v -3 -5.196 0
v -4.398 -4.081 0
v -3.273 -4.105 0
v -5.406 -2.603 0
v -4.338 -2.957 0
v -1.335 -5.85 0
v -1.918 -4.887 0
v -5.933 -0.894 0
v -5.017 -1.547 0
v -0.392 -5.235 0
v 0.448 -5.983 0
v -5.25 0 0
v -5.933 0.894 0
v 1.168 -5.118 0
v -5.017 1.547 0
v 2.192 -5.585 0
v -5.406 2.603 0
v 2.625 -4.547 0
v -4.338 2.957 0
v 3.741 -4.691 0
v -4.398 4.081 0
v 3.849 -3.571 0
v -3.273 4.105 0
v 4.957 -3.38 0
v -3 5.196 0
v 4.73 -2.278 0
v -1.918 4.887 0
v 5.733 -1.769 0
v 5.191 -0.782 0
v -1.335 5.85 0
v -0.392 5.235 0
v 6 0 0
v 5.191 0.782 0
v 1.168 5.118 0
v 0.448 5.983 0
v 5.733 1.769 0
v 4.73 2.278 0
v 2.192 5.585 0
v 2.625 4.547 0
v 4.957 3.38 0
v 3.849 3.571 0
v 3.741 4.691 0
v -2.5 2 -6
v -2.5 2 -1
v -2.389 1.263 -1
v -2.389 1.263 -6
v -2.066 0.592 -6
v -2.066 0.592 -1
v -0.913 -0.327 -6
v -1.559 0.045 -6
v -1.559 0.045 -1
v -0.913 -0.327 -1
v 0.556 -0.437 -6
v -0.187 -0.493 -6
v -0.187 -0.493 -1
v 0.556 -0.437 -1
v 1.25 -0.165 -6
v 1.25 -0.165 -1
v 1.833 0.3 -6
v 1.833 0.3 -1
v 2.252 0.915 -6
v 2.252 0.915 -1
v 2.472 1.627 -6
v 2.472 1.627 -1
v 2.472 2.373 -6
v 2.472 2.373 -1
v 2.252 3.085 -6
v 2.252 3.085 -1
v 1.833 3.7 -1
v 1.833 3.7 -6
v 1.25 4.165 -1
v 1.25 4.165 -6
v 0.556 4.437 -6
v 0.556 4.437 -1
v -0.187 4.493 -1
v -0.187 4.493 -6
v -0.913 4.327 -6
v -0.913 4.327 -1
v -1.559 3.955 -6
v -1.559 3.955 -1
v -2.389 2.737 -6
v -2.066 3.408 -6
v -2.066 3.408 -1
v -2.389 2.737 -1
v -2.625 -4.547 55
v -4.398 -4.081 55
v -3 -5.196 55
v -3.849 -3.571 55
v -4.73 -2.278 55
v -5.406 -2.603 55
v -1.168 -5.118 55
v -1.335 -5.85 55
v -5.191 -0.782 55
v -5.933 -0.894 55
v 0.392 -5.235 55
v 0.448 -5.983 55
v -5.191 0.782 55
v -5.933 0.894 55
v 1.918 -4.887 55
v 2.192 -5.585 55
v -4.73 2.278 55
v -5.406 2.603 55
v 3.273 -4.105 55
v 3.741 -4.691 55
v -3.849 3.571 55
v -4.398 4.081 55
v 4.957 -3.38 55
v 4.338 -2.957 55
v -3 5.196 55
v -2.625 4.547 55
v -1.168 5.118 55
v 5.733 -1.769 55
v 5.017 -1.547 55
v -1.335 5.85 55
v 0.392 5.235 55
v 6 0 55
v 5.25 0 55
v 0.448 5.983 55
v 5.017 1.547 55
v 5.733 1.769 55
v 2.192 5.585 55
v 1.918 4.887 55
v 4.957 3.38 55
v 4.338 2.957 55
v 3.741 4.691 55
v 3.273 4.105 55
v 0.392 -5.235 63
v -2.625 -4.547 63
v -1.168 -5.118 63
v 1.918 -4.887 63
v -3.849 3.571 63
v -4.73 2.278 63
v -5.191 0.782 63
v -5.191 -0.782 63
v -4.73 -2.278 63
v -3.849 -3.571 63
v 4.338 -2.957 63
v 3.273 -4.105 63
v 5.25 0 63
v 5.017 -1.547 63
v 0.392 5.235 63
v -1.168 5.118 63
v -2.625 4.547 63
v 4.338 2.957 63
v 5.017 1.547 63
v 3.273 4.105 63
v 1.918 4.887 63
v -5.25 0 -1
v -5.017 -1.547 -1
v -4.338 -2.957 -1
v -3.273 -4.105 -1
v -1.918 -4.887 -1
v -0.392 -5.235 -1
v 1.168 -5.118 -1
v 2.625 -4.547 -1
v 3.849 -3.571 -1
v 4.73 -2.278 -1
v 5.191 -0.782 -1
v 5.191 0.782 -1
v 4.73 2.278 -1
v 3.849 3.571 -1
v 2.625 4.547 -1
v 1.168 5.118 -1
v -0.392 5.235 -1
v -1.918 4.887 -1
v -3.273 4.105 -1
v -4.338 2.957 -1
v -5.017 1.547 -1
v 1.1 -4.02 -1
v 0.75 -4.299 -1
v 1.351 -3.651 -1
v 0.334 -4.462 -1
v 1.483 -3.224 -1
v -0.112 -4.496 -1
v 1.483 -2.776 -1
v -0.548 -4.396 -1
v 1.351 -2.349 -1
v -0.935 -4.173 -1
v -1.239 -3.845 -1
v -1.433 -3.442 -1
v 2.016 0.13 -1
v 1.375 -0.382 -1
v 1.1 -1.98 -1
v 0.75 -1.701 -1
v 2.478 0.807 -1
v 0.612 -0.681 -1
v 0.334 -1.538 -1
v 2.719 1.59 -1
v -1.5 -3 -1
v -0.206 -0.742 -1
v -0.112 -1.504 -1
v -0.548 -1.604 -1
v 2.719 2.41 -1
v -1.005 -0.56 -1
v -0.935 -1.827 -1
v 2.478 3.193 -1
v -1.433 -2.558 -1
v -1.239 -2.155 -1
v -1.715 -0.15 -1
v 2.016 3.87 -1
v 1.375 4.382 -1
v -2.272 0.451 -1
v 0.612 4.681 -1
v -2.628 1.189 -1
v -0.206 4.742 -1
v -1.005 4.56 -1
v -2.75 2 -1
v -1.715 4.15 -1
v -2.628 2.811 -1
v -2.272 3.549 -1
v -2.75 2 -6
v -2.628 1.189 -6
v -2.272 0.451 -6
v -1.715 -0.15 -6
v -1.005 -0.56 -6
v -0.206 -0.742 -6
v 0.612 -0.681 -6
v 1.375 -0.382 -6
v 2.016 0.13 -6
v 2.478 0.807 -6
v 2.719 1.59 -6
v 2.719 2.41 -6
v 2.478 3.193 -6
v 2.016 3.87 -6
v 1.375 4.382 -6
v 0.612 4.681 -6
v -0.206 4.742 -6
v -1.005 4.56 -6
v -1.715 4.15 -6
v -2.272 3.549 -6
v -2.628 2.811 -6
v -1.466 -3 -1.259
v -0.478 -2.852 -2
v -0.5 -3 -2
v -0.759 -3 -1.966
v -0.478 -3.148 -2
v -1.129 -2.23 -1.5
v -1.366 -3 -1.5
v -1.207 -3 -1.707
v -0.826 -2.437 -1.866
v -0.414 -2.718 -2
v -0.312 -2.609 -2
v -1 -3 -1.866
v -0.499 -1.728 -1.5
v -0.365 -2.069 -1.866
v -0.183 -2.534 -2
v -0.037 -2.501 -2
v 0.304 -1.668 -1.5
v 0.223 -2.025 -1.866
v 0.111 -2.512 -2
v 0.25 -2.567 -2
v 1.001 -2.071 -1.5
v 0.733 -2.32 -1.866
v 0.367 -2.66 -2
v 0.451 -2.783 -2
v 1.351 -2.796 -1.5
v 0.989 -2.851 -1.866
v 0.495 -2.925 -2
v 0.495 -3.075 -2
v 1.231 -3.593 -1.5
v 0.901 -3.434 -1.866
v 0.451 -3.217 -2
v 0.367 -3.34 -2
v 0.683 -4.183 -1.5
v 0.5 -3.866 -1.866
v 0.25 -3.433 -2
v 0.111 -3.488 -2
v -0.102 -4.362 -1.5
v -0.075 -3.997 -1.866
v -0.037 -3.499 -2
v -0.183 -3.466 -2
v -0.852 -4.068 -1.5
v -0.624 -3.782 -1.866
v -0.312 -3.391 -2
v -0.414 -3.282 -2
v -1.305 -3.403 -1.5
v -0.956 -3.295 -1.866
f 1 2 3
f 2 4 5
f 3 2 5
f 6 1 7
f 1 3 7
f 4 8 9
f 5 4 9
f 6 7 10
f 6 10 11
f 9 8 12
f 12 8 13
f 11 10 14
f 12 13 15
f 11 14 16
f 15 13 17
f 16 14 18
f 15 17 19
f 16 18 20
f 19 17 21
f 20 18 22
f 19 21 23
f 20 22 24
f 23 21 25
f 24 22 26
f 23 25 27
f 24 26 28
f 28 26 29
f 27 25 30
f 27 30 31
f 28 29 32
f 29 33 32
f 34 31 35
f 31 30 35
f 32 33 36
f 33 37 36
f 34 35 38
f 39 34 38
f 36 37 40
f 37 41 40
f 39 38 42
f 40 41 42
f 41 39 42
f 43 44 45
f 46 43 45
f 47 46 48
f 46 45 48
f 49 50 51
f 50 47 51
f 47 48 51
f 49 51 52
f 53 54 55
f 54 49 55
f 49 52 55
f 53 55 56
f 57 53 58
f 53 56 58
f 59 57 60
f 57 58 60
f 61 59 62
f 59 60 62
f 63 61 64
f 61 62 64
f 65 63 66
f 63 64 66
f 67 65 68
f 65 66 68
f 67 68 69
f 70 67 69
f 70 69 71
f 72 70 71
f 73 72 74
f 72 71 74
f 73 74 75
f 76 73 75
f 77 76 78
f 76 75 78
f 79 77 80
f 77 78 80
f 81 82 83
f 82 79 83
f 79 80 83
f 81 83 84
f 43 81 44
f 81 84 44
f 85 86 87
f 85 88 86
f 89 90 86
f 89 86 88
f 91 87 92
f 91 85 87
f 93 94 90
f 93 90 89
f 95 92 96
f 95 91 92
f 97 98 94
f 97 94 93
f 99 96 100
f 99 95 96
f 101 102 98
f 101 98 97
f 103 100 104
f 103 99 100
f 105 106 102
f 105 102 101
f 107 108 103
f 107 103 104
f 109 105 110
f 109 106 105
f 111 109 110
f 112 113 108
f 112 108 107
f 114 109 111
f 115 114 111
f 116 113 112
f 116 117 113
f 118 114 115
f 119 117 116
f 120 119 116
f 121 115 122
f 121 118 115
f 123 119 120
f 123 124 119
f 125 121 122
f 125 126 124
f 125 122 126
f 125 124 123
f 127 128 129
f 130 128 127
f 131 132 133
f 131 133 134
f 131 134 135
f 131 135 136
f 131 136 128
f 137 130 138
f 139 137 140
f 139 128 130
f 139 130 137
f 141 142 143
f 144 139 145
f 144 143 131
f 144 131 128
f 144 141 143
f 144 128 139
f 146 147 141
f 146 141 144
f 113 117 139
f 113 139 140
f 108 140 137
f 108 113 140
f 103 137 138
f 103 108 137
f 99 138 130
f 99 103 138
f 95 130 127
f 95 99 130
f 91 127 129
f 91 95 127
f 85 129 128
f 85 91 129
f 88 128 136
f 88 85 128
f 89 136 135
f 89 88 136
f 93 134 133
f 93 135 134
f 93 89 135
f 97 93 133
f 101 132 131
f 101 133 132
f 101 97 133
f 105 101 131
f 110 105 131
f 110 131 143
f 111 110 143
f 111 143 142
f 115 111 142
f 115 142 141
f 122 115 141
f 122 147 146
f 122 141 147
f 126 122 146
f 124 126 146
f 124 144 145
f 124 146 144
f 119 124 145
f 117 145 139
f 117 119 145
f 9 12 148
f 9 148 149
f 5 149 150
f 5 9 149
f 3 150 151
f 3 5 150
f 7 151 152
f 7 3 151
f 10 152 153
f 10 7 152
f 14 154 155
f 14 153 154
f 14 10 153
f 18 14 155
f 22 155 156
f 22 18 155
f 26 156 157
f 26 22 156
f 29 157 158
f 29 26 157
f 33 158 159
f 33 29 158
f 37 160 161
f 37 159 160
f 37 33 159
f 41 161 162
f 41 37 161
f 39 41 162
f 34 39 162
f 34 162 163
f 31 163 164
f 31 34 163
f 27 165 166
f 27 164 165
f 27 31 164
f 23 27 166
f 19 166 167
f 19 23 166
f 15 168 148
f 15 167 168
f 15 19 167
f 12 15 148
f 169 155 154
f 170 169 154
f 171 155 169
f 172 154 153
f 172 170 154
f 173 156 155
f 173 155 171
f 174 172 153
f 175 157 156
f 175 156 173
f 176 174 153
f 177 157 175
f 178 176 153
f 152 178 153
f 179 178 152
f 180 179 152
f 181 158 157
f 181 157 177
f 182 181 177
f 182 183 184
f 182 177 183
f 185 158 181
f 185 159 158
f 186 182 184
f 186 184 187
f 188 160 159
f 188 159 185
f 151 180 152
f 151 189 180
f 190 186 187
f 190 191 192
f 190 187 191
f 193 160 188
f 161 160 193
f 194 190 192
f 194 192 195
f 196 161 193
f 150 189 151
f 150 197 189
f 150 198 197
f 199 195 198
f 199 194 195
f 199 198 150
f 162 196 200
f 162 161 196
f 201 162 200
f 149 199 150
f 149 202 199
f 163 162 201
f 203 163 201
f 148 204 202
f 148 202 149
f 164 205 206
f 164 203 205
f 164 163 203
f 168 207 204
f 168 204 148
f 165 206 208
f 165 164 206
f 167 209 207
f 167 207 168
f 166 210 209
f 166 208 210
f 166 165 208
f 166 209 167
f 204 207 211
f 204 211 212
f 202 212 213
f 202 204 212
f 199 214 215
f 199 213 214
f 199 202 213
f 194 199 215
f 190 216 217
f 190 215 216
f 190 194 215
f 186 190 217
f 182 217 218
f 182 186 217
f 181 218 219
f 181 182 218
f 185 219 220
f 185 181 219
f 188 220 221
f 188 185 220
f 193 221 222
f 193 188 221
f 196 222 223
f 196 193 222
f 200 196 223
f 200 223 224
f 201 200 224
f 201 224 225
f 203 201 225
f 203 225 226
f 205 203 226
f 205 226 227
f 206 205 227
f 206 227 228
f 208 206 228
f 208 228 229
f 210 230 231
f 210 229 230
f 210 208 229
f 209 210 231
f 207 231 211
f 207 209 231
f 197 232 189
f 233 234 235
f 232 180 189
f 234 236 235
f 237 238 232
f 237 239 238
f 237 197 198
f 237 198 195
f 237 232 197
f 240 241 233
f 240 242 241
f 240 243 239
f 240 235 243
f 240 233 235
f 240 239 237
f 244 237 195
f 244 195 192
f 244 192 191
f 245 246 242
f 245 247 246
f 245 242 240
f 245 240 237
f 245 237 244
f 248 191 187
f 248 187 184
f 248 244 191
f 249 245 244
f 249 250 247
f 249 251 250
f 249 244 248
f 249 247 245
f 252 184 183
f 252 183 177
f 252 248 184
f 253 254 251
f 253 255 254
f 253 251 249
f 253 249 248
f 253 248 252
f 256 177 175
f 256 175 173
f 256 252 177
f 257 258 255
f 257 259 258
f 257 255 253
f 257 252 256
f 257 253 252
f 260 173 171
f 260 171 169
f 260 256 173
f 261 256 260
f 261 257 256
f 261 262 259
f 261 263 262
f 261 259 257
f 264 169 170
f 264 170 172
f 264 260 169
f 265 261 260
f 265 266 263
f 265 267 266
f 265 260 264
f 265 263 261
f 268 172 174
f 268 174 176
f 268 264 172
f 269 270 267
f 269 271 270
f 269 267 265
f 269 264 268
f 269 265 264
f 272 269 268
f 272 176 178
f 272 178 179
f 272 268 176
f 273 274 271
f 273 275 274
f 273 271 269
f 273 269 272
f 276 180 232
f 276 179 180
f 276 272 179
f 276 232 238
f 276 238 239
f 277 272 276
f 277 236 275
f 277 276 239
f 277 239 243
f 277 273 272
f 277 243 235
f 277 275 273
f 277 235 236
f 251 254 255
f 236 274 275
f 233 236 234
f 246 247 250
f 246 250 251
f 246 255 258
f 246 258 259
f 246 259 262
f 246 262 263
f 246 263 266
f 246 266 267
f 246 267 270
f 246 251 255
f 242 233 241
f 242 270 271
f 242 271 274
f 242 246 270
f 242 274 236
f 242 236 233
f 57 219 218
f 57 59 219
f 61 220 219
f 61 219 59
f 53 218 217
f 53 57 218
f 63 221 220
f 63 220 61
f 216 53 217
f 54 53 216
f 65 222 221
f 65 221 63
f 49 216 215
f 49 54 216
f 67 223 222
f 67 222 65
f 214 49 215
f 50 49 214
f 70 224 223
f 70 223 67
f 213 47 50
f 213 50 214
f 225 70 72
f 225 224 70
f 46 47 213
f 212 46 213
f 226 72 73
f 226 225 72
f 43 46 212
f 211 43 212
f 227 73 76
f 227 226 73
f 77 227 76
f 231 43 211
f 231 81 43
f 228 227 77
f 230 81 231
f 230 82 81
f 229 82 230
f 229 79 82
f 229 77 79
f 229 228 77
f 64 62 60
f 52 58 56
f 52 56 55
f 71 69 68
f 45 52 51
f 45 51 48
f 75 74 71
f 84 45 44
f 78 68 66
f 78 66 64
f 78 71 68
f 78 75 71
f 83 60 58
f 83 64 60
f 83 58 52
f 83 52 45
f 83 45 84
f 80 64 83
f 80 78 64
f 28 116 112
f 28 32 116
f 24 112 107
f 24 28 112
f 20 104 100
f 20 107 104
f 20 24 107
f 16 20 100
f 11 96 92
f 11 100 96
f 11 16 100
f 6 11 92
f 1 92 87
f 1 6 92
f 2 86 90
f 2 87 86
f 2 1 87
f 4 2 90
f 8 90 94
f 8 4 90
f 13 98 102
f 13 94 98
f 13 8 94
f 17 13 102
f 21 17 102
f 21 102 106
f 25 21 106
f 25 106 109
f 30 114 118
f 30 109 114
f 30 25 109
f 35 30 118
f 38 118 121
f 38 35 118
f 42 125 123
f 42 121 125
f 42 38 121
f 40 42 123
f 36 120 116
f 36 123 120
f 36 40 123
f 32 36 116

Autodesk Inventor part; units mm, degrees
ref_plane "YZ Plane" through (0, 0, 0) normal (1, 0, 0) x (0, 1, 0)
ref_plane "XZ Plane" through (0, 0, 0) normal (0, 1, 0) x (-1, 0, 0)
ref_plane "XY Plane" through (0, 0, 0) normal (0, 0, 1) x (1, 0, 0)
sketch "Эскиз1" plane through (0, 0, 0) normal (0, 0, 1) x (1, 0, 0)
  circle A0 centre (0, 0) radius 6
  dimension "d0" = 12
extrude "Выдавливание1" add sketch "Эскиз1" along normal blind 55
sketch "Эскиз2" plane through (0, 0, 55) normal (0, 0, 1) x (1, 0, 0)
  circle A0 centre (0, 0) radius 5.25
  dimension "d3" = 10.5
extrude "Выдавливание2" add sketch "Эскиз2" along normal blind 8
sketch "Эскиз3" plane through (0, 0, 0) normal (0, 0, -1) x (-1, 0, 0)
  circle A0 centre (0, 0) radius 5.25
  dimension "d6" = 10.5
extrude "Выдавливание3" add sketch "Эскиз3" along normal blind 1
thread "Резьба1" size "M12x1" class "6g" standard "ANSI Metric M Profile" length 45
sketch "Эскиз4" plane through (0, 0, -1) normal (0, 0, -1) x (-1, 0, 0)
  circle A0 centre (0, 2) radius 2.75
  circle A1 centre (0, 2) radius 2.5
  point P0 (0, 0)
  dimension "d11" = 5.5
  dimension "d12" = 2
  dimension "d13" = 5
extrude "Выдавливание4" add sketch "Эскиз4" along normal blind 5
sketch "Эскиз5" plane through (0, 0, -1) normal (0, 0, -1) x (-1, 0, 0)
  circle A0 centre (0, -3) radius 1.5
  point P0 (0, 0)
  dimension "d16" = 3
  dimension "d17" = 3
extrude "Выдавливание5" add sketch "Эскиз5" along normal blind 1
fillet "Сопряжение1" radius 1 1 edges at (1.5, -3, -2)
properties part number "LJ12A3-4-Z-BX"
